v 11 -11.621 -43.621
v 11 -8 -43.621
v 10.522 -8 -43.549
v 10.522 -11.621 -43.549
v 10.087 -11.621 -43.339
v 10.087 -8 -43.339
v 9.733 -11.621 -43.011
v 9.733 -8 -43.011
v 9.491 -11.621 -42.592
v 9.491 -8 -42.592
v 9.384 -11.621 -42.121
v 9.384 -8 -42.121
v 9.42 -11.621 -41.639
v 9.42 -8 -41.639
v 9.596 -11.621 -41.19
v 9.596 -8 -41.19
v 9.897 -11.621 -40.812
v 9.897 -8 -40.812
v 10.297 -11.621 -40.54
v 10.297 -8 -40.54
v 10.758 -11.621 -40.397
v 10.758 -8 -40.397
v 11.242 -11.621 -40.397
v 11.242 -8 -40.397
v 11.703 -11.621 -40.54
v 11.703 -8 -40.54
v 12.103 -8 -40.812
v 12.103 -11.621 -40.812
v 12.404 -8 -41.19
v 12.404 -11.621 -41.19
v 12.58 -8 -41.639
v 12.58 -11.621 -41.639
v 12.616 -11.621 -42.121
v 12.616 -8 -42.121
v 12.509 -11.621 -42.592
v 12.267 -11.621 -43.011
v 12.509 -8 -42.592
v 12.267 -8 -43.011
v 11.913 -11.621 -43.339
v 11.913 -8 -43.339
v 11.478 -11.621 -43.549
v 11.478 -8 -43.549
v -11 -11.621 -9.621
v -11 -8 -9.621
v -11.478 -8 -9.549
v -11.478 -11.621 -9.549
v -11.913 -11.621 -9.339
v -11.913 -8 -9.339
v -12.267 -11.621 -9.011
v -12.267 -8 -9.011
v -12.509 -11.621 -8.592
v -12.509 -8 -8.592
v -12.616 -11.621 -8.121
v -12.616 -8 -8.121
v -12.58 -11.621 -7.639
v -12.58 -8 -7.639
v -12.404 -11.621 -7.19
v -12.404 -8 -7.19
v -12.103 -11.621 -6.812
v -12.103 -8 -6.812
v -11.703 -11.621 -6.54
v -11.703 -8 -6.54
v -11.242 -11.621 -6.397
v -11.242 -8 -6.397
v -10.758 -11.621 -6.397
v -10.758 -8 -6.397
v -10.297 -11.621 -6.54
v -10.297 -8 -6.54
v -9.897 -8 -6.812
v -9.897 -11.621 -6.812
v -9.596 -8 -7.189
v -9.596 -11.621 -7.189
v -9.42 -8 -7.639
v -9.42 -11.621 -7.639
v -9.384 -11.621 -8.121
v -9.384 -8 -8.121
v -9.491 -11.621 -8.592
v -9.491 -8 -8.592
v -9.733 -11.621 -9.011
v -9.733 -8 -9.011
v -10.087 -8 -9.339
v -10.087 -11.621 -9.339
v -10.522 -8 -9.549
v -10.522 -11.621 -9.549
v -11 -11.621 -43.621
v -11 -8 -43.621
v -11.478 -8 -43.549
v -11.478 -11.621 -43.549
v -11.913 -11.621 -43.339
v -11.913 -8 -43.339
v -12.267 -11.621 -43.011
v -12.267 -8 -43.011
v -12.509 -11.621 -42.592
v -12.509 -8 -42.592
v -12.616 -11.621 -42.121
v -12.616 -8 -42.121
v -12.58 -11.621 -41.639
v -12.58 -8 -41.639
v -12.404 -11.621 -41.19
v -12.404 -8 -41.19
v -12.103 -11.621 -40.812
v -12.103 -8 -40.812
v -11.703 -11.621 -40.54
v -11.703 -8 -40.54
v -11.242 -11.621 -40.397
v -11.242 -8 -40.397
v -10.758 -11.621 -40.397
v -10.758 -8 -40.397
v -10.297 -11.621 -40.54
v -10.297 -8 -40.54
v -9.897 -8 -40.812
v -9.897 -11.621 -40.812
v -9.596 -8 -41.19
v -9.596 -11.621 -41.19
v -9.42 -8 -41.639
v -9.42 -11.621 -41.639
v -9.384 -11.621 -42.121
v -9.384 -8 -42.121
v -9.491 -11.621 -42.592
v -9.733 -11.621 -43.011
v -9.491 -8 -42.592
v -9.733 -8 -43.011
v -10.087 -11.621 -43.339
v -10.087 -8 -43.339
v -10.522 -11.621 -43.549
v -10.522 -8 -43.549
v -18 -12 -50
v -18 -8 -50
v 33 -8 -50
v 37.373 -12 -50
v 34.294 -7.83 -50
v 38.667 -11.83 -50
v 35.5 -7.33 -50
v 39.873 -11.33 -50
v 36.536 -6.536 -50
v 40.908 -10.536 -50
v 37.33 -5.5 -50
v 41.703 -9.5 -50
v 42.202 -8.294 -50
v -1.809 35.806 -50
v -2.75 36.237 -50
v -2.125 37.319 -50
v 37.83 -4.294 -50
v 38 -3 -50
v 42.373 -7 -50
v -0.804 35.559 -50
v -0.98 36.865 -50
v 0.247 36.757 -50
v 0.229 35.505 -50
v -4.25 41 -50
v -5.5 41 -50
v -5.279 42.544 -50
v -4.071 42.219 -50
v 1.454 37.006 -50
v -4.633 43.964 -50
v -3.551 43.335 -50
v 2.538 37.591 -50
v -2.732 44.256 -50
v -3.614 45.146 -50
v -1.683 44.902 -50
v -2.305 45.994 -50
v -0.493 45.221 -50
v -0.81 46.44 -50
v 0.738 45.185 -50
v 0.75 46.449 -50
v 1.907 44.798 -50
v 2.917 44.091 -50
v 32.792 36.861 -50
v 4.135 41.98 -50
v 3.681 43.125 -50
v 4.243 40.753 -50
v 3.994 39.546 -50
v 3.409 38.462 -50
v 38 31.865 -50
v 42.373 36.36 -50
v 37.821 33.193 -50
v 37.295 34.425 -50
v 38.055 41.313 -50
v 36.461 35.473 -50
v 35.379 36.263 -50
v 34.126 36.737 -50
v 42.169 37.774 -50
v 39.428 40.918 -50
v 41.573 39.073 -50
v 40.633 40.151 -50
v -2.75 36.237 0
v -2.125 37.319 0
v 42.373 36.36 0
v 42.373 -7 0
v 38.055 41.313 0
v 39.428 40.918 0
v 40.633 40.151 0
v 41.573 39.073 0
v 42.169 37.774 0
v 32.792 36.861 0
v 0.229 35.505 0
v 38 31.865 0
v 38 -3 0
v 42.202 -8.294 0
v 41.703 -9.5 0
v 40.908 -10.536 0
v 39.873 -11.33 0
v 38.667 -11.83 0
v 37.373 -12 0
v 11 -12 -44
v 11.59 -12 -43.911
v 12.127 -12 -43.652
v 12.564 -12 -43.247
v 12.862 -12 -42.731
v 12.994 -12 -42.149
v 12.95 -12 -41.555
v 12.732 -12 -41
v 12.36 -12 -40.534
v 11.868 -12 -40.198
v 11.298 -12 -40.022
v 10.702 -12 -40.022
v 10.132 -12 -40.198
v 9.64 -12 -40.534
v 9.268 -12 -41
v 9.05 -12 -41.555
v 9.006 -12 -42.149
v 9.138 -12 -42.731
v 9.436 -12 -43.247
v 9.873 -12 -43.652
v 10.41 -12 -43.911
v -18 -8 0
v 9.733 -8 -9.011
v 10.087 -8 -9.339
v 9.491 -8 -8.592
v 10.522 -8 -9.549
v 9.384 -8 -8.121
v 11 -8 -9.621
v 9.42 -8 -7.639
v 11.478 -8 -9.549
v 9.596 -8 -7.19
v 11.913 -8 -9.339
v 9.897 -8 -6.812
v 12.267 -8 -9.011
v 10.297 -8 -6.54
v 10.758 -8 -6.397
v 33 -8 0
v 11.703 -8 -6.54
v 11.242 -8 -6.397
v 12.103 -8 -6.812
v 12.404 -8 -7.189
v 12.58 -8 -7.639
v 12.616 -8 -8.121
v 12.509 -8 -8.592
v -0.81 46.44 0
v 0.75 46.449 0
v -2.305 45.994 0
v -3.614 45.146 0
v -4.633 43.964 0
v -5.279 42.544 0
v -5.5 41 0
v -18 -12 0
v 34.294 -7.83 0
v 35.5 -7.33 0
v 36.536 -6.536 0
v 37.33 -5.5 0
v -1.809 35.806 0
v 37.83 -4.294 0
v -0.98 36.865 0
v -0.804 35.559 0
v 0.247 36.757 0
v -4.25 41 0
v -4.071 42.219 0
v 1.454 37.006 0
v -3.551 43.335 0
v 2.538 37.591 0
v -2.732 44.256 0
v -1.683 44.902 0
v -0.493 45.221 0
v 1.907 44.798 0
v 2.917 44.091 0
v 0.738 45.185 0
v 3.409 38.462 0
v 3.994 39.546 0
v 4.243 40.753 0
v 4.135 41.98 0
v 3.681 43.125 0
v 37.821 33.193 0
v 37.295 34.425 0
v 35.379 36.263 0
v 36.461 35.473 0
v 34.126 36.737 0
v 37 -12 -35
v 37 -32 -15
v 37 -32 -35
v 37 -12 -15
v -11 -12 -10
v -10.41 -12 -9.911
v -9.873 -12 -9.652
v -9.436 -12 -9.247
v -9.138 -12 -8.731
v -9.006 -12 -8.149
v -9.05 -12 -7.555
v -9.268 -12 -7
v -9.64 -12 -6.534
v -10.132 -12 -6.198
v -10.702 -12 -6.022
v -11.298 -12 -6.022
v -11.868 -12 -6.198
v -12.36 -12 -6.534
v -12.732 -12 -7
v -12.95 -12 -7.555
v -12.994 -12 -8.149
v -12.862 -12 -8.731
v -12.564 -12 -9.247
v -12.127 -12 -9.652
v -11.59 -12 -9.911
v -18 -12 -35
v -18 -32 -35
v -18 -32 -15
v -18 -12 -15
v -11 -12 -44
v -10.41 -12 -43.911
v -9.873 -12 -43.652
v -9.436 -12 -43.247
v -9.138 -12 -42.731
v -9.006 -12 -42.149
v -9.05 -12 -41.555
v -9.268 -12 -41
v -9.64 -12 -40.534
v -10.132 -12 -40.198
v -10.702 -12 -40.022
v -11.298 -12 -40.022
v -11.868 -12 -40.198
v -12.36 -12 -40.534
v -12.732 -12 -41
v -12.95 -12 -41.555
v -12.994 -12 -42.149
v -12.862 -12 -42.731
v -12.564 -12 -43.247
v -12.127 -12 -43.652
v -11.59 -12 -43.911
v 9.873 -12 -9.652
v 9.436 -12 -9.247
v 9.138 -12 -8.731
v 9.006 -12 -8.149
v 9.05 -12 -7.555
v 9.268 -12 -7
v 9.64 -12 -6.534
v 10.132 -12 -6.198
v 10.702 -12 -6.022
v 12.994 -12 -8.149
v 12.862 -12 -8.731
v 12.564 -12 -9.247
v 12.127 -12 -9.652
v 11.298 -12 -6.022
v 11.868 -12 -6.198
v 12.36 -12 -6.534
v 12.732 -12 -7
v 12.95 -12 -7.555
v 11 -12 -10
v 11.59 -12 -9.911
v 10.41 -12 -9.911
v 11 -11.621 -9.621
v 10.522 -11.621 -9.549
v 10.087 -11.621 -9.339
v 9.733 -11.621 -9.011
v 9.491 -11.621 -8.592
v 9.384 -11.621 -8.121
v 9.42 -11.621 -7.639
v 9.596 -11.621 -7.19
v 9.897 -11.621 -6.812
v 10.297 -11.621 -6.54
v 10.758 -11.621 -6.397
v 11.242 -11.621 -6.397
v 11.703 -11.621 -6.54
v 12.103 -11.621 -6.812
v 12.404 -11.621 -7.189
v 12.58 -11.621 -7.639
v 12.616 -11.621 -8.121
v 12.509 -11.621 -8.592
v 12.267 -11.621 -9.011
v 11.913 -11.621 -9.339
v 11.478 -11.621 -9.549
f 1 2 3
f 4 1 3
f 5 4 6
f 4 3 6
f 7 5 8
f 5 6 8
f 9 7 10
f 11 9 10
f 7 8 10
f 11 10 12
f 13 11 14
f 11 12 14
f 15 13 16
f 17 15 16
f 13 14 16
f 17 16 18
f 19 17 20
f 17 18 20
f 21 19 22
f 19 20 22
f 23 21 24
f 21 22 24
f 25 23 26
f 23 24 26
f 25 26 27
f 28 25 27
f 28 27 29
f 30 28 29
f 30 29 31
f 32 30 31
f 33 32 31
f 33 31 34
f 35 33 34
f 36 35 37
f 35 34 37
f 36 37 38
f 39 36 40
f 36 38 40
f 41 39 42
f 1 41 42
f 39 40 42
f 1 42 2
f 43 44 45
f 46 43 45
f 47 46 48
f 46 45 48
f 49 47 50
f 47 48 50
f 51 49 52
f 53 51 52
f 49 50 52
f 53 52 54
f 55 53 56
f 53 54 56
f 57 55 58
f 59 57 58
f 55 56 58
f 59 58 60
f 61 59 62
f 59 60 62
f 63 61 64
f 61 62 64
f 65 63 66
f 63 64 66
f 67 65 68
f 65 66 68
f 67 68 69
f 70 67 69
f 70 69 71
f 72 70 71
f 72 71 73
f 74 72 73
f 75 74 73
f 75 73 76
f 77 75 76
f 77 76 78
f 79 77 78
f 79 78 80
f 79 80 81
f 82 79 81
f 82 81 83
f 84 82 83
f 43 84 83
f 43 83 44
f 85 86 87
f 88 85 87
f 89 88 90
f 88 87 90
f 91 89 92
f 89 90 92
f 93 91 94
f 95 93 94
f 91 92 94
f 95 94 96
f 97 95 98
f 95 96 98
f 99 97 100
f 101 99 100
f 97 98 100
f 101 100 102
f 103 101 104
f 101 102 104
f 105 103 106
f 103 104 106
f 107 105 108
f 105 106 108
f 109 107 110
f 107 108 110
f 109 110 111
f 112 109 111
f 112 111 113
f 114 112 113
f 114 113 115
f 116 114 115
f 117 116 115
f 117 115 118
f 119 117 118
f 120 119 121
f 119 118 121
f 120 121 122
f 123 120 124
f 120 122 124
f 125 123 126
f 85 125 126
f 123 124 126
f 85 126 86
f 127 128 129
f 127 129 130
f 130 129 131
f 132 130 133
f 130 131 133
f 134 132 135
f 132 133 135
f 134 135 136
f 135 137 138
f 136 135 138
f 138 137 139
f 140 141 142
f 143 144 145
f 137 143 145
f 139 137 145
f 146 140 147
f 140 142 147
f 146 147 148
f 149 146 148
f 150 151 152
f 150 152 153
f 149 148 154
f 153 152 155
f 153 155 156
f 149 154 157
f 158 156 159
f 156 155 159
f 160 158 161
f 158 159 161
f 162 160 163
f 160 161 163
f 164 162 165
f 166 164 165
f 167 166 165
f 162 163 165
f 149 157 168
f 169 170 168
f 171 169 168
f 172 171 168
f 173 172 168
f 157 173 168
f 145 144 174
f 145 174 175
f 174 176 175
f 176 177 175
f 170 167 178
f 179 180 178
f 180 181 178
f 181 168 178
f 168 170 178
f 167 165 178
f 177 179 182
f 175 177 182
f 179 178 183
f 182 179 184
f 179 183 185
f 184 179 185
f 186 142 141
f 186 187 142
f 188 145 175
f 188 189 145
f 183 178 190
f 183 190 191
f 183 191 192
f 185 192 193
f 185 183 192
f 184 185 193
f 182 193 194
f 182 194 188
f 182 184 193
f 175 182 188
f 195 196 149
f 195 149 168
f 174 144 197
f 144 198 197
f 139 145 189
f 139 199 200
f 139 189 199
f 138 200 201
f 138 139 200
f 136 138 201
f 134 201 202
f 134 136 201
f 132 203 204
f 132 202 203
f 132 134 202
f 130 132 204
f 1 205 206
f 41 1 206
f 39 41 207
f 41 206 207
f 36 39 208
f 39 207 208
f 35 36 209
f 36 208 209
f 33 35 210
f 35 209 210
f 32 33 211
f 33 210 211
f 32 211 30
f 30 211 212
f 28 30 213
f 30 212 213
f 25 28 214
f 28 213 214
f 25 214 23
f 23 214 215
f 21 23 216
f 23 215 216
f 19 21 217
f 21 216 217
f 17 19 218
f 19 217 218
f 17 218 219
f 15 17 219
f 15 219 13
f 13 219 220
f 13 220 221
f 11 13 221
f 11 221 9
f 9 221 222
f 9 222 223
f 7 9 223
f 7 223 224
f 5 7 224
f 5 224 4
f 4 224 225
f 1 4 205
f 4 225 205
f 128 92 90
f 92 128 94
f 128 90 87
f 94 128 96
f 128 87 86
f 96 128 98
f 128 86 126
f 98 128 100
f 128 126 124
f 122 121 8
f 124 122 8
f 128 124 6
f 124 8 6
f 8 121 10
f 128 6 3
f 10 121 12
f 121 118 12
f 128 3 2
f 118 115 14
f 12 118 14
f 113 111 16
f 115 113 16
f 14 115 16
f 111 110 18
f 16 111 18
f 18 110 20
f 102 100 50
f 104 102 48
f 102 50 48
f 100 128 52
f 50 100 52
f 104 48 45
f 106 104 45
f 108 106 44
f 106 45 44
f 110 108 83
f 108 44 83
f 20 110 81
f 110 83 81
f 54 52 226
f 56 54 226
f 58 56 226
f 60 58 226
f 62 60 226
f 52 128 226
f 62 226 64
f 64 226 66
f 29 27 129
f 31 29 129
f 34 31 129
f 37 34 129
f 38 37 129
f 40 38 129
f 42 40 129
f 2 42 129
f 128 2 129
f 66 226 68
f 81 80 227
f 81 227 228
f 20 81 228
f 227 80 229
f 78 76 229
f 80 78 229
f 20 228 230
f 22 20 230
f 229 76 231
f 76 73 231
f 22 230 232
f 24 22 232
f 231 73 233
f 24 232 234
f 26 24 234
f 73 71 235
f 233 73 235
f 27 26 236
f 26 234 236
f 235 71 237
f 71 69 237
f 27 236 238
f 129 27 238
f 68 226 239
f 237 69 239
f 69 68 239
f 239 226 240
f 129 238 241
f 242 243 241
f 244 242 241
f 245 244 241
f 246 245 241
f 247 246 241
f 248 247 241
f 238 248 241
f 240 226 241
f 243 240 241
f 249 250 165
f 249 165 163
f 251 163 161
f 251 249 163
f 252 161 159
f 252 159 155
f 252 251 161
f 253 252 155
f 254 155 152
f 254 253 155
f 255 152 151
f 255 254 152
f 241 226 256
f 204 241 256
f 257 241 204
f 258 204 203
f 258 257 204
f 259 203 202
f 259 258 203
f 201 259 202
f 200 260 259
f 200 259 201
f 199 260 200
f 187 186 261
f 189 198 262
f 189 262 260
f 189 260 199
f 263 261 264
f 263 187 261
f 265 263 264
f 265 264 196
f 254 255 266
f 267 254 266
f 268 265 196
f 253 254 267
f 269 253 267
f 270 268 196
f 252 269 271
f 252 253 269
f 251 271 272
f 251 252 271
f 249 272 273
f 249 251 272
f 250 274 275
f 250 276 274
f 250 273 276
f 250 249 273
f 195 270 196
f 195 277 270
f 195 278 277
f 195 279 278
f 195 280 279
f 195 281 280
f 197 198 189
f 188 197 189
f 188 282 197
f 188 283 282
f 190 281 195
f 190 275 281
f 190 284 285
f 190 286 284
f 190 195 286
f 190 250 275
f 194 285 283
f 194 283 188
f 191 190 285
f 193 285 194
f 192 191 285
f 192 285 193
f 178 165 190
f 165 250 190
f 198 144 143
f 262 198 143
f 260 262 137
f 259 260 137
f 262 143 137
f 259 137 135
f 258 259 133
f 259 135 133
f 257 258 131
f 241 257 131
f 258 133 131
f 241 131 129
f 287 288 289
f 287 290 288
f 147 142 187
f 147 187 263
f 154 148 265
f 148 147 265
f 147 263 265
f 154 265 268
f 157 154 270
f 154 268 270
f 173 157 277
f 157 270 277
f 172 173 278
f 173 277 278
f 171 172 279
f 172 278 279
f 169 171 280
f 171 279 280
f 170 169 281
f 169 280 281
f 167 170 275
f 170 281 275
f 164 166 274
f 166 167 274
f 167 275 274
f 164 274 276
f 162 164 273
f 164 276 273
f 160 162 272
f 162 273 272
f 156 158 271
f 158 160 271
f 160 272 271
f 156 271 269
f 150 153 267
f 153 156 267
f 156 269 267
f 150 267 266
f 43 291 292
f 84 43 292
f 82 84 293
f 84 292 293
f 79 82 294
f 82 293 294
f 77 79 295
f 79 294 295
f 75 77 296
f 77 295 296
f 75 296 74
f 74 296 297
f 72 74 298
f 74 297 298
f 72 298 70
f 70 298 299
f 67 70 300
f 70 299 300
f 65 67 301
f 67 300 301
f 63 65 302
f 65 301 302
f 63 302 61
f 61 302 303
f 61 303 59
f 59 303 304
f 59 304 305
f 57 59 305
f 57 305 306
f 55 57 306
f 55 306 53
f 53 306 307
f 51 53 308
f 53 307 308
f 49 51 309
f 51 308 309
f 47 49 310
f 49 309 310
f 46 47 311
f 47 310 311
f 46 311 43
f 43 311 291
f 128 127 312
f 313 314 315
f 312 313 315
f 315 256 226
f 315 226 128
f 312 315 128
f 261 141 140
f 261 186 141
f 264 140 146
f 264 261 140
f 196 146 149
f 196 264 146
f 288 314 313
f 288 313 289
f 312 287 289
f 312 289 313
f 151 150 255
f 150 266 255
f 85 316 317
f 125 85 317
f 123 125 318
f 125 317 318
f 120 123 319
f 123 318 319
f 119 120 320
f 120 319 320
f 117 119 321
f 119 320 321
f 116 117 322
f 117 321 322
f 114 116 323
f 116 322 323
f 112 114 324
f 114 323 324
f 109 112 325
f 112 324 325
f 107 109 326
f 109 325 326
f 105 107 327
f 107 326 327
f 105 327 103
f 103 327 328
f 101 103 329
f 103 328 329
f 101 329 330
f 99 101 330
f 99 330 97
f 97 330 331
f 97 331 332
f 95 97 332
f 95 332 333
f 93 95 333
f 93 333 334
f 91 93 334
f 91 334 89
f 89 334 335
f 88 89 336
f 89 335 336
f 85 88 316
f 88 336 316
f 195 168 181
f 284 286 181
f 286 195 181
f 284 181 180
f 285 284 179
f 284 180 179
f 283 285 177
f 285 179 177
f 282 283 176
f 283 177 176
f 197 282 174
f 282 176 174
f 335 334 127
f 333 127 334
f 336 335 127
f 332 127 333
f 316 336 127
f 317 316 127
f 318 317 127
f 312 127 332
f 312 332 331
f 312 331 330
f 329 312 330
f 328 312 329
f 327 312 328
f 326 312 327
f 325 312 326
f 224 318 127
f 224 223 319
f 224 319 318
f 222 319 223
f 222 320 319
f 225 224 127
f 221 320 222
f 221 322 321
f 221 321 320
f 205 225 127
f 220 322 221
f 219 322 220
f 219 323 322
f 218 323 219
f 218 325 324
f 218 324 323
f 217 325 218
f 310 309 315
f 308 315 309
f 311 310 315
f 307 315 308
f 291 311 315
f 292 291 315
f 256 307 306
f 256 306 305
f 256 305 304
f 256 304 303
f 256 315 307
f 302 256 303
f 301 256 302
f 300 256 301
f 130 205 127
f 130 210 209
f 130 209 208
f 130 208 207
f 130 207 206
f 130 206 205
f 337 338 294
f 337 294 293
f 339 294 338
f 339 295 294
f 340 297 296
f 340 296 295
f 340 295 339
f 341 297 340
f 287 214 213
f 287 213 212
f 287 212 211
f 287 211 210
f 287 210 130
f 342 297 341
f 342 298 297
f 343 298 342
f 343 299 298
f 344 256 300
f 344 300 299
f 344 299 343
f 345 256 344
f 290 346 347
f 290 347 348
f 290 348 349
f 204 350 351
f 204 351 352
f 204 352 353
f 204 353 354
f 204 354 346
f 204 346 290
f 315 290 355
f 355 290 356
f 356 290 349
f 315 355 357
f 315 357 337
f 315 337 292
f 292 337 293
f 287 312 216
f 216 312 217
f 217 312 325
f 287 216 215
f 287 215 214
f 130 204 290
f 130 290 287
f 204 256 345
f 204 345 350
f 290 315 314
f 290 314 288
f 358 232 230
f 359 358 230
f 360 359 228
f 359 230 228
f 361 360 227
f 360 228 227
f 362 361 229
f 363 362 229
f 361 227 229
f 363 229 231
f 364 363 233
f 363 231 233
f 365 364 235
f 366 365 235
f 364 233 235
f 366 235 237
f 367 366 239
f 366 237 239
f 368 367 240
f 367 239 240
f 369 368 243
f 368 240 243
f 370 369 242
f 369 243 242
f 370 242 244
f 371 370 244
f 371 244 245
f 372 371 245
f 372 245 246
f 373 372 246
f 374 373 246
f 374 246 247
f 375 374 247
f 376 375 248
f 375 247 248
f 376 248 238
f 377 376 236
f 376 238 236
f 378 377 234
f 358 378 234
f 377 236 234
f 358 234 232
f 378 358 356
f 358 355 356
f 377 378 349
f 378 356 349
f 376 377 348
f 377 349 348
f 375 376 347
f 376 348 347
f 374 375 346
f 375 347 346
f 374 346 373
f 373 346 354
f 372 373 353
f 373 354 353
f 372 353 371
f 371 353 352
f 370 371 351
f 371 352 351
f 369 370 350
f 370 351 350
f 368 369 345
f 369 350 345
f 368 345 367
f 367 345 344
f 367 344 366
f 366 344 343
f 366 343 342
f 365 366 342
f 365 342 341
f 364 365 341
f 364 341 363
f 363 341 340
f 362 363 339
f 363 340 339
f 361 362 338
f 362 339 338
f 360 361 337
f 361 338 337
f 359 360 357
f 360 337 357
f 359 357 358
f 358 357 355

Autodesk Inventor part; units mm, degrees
ref_plane "YZ Plane" through (0, 0, 0) normal (1, 0, 0) x (0, 1, 0)
ref_plane "XZ Plane" through (0, 0, 0) normal (0, 1, 0) x (-1, 0, 0)
ref_plane "XY Plane" through (0, 0, 0) normal (0, 0, 1) x (1, 0, 0)
sketch "草图1" plane through (0, 0, 0) normal (0, 0, 1) x (1, 0, 0)
  circle A0 centre (0, 41) radius 4.25 projected
  circle A1 centre (0, 41) radius 4.25
  line L0 (0, 41) -> (-2.75, 36.2369)
  line L1 (0, 41) -> (5.5, 41) construction
  line L2 (0, 41) -> (-5.5, 41)
  line L3 (0.7501, 46.4486) -> (42.3728, 40.7189)
  line L4 (-15, 3) -> (-15, 6) projected
  line L5 (-15, 6) -> (-18, 6) projected
  line L6 (-18, 6) -> (-18, -8) projected
  line L7 (-4, -8) -> (-18, -8) projected
  line L8 (-4, -6) -> (-4, -8) projected
  line L9 (-4, -6) -> (4, -6) projected
  line L10 (4, -6) -> (4, -8) projected
  line L11 (18, -8) -> (4, -8) projected
  line L12 (18, 6) -> (18, -8) projected
  line L13 (18, 6) -> (15, 6) projected
  line L14 (15, 6) -> (15, 3) projected
  line L15 (15, 3) -> (13.5, 3) projected
  line L16 (13.5, 3) -> (13.5, 2) projected
  line L17 (13.5, 2) -> (15, 2) projected
  line L18 (15, 2) -> (15, -2) projected
  line L19 (15, -2) -> (-15, -2) projected
  line L20 (-15, -2) -> (-15, 2) projected
  line L21 (-15, 2) -> (-13.5, 2) projected
  line L22 (-13.5, 2) -> (-13.5, 3) projected
  line L23 (-13.5, 3) -> (-15, 3) projected
  line L24 (-18, -8) -> (18, -8)
  line L25 (18, -8) -> (18, -12)
  line L26 (18, -12) -> (-18, -12)
  line L27 (-18, -12) -> (-18, -8)
  line L28 (18, -12) -> (42.3728, -12)
  line L29 (42.3728, -12) -> (42.3728, 40.7189)
  line L30 (18, -8) -> (38, -8)
  line L31 (38, -8) -> (38, 37.0777)
  line L32 (0.2288, 35.5048) -> (38, 37.0777)
  arc A2 (-2.75, 36.2369) -> (0.2288, 35.5048) centre (0, 41) ccw
  arc A3 (0.7501, 46.4486) -> (-5.5, 41) centre (0, 41) ccw
  point P0 (0, 0)
  point P1 (-4.25, 41)
  point P2 (-2.125, 37.3194)
  dimension "d1" = 120
  dimension "d2" = 4
  dimension "d3" = 20
extrude "拉伸1" add sketch "草图1" against normal blind 50 contours A0 L2 A3 L3 L29 L28 L25 L30 L31 L32 A2 L0 | L26 L27 L7 L24 L11 L25
fillet "圆角1" radius 5 2 edges at (38, 37.0777, -25) (42.3728, 40.7189, -25)
fillet "圆角2" radius 5 2 edges at (38, -8, -25) (42.3728, -12, -25)
sketch "草图2" plane through (-18, -12, -50) normal (0, -1, 0) x (1, 0, 0)
  line L0 (0, 50) -> (55.3728, 50) projected
  line L1 (0, 50) -> (0, 0) projected
  line L2 (55.3728, 0) -> (0, 0) projected
  point P0 (18, 50)
  point P1 (7, 42)
  point P2 (7, 8)
  point P3 (29, 42)
  point P4 (29, 8)
  dimension "d8" = 8
  dimension "d9" = 7
  dimension "d10" = 8
  dimension "d11" = 22
hole "孔1" at (-11, -12, -8) at (-11, -12, -42) at (11, -12, -8) at (11, -12, -42) direction (0, 1, 0) diameter 3.242 depth 4 countersink diameter 4 countersink angle 90 thread size "M4x0.7" designation "M4" class "6H" standard "GB Metric profile"
sketch "草图3" plane through (-18, -12, -50) normal (0, -1, 0) x (1, 0, 0)
  line L0 (0, 50) -> (0, 0) projected
  line L1 (0, 35) -> (55, 35)
  line L2 (55, 35) -> (55, 15)
  line L3 (55, 15) -> (0, 15)
  line L4 (0, 15) -> (0, 35)
  line L5 (0, 50) -> (55.3728, 50) projected
  point P0 (18, 50)
  point P1 (0, 15)
  dimension "d19" = 55
  dimension "d20" = 20
  dimension "d21" = 15
extrude "拉伸2" add sketch "草图3" along normal blind 20
properties part number "链接板2"
